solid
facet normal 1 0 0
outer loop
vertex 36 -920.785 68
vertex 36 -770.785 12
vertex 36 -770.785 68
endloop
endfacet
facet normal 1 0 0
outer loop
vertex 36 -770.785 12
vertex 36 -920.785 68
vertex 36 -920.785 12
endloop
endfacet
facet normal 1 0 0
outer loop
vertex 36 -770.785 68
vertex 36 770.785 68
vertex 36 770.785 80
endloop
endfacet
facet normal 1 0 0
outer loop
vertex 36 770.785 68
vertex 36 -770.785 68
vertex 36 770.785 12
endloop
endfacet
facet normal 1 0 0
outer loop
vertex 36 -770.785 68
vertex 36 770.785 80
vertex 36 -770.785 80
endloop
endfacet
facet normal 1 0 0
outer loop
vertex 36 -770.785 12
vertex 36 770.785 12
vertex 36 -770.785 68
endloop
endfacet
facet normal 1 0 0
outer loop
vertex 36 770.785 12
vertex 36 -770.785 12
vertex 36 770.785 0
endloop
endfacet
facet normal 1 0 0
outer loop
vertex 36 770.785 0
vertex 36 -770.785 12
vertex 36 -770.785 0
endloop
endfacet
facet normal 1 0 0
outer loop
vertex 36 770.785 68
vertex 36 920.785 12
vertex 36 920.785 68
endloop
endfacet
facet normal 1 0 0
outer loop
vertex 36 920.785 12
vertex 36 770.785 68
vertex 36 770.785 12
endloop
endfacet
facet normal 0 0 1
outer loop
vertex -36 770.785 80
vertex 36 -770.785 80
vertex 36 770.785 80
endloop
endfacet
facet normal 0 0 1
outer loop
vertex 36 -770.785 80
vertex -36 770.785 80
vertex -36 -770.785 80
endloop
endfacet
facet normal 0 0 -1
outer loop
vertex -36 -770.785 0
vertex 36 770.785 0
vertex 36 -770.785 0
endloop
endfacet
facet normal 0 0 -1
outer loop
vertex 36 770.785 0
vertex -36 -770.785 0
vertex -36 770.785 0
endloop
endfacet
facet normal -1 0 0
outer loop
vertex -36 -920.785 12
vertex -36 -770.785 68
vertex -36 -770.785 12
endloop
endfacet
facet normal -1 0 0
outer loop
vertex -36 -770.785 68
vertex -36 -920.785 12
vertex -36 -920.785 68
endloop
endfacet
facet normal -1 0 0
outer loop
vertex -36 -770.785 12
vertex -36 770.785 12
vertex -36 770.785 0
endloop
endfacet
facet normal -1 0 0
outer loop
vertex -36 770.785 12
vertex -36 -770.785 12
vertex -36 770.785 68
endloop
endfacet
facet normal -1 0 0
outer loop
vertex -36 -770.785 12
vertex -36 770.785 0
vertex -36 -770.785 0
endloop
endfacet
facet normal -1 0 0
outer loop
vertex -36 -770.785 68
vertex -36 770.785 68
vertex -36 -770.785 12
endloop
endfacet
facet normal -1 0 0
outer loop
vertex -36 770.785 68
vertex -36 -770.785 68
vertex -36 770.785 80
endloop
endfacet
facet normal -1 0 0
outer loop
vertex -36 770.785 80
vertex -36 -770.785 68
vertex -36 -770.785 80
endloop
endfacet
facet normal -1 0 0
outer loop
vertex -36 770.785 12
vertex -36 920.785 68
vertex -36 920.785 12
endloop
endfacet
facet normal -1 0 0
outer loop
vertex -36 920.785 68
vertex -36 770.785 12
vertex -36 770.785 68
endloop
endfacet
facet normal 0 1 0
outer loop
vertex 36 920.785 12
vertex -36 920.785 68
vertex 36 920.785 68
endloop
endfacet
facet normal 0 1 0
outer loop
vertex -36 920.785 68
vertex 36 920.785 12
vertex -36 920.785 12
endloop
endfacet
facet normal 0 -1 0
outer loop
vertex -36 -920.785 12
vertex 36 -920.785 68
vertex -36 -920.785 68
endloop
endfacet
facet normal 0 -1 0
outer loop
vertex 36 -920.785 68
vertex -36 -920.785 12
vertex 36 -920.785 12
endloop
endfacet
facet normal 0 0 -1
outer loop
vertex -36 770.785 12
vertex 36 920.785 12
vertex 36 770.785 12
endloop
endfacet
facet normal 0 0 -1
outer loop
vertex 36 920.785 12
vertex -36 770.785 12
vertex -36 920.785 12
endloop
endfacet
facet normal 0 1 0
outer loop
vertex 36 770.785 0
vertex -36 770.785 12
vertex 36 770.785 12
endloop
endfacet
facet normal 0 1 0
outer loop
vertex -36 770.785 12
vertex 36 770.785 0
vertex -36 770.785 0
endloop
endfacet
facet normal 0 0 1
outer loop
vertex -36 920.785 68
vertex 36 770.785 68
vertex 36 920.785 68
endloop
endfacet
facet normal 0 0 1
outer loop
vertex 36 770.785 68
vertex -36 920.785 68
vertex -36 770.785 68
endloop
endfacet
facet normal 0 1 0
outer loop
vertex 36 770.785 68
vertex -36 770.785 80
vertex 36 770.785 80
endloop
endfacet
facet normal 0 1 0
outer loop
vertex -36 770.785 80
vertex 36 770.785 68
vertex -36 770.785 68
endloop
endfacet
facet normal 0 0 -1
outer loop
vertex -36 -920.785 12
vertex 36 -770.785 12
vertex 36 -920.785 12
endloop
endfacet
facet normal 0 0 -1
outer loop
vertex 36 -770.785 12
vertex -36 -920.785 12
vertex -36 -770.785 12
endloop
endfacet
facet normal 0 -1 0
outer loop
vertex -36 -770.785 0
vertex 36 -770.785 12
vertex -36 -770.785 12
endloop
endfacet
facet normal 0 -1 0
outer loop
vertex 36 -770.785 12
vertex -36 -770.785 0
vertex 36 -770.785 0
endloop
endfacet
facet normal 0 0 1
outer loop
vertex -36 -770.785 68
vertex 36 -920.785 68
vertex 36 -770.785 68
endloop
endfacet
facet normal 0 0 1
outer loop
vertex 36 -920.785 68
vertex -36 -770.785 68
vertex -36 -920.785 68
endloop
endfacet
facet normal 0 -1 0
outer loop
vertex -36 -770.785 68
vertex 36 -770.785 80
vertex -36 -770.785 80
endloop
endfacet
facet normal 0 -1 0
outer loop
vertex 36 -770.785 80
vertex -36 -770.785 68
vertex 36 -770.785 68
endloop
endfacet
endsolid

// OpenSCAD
// file: ybrace.scad
// ybrace
include <dims.scad>;

ybrace();

module ybrace(){
	translate([ dim_critical * -0.5, dim_yBrace * -1 - dim_baseExtension, 0])cube([dim_critical, dim_yBrace, dim_ply]);
	rotate([ 0, 0, ang_horizontal * 0.5])translate([ dim_critical * -0.5, -dim_baseExtension, 0])cube([dim_critical, dim_yBrace, dim_ply]);
	rotate([ 0, 0, ang_horizontal * -0.5])translate([ dim_critical * -0.5, -dim_baseExtension, 0])cube([dim_critical, dim_yBrace, dim_ply]);
	
	echo("dim_critical",dim_critical);
	echo("dim_baseExtension",dim_baseExtension);
	echo("dim_baseExtension + dim_critical",dim_baseExtension + dim_critical);


}

module plate(){
	scale([ 2, 1, 2])cube([dim_critical, dim_yBrace, dim_ply]);
}
// file: dims.scad
function i2m(x)=x*25.4;
function ASA(alpha,a,beta) = ((a/sin(alpha))*sin(beta));
//echo("ASA(90, 19.05, 60) == 16.5, but was ", ASA(90,19.05,60));

//Table Height
dim_tableHeight = i2m(29);

//Table Length
dim_tableLength = 2800;

// Table Width
dim_tableWidth = 1000;

// Table top
dim_tableTop = 20;

// Leg gap
dim_legGap = 1800;

// Ply Thickness
dim_ply = 12;

// Ply stack
qty_ply = 6;

//Critical dim
dim_critical = dim_ply * qty_ply;

//Vertical angle
ang_vertical = 10;

//Base thickness
dim_thickness = 80;

//Horizontal angle
ang_horizontal = 120;

// base extension
dim_baseExtension = ASA(ang_horizontal / 2 , dim_critical / 2, 90 - (ang_horizontal / 2 ));

// y brace
dim_yBrace = 150;

// Lower leg length
dim_lowerLeg = 360;

// Lower rad
rad_lower = 100;

// Upper rad
rad_upper = 50;
// main file
//bar
include <dims.scad>;
use <ybrace.scad>;

bar();

module bar(){
	difference(){	
		echo("Bar len = ", dim_legGap + 2 * dim_baseExtension);
		translate([ 0, 0, dim_thickness * 0.5])cube([ dim_critical, dim_legGap + 2 * dim_baseExtension, dim_thickness], center=true);
		
		translate([ dim_critical * -1, dim_legGap * 0.5 + dim_baseExtension - dim_yBrace, -1 * dim_ply])plate();
		translate([ dim_critical * -1, dim_legGap * 0.5 + dim_baseExtension - dim_yBrace, dim_thickness - dim_ply])plate();
		
		translate([ dim_critical * -1, dim_legGap * -0.5 - dim_baseExtension, -1 * dim_ply])plate();
		translate([ dim_critical * -1, dim_legGap * -0.5 - dim_baseExtension, dim_thickness - dim_ply])plate();
	}
}
